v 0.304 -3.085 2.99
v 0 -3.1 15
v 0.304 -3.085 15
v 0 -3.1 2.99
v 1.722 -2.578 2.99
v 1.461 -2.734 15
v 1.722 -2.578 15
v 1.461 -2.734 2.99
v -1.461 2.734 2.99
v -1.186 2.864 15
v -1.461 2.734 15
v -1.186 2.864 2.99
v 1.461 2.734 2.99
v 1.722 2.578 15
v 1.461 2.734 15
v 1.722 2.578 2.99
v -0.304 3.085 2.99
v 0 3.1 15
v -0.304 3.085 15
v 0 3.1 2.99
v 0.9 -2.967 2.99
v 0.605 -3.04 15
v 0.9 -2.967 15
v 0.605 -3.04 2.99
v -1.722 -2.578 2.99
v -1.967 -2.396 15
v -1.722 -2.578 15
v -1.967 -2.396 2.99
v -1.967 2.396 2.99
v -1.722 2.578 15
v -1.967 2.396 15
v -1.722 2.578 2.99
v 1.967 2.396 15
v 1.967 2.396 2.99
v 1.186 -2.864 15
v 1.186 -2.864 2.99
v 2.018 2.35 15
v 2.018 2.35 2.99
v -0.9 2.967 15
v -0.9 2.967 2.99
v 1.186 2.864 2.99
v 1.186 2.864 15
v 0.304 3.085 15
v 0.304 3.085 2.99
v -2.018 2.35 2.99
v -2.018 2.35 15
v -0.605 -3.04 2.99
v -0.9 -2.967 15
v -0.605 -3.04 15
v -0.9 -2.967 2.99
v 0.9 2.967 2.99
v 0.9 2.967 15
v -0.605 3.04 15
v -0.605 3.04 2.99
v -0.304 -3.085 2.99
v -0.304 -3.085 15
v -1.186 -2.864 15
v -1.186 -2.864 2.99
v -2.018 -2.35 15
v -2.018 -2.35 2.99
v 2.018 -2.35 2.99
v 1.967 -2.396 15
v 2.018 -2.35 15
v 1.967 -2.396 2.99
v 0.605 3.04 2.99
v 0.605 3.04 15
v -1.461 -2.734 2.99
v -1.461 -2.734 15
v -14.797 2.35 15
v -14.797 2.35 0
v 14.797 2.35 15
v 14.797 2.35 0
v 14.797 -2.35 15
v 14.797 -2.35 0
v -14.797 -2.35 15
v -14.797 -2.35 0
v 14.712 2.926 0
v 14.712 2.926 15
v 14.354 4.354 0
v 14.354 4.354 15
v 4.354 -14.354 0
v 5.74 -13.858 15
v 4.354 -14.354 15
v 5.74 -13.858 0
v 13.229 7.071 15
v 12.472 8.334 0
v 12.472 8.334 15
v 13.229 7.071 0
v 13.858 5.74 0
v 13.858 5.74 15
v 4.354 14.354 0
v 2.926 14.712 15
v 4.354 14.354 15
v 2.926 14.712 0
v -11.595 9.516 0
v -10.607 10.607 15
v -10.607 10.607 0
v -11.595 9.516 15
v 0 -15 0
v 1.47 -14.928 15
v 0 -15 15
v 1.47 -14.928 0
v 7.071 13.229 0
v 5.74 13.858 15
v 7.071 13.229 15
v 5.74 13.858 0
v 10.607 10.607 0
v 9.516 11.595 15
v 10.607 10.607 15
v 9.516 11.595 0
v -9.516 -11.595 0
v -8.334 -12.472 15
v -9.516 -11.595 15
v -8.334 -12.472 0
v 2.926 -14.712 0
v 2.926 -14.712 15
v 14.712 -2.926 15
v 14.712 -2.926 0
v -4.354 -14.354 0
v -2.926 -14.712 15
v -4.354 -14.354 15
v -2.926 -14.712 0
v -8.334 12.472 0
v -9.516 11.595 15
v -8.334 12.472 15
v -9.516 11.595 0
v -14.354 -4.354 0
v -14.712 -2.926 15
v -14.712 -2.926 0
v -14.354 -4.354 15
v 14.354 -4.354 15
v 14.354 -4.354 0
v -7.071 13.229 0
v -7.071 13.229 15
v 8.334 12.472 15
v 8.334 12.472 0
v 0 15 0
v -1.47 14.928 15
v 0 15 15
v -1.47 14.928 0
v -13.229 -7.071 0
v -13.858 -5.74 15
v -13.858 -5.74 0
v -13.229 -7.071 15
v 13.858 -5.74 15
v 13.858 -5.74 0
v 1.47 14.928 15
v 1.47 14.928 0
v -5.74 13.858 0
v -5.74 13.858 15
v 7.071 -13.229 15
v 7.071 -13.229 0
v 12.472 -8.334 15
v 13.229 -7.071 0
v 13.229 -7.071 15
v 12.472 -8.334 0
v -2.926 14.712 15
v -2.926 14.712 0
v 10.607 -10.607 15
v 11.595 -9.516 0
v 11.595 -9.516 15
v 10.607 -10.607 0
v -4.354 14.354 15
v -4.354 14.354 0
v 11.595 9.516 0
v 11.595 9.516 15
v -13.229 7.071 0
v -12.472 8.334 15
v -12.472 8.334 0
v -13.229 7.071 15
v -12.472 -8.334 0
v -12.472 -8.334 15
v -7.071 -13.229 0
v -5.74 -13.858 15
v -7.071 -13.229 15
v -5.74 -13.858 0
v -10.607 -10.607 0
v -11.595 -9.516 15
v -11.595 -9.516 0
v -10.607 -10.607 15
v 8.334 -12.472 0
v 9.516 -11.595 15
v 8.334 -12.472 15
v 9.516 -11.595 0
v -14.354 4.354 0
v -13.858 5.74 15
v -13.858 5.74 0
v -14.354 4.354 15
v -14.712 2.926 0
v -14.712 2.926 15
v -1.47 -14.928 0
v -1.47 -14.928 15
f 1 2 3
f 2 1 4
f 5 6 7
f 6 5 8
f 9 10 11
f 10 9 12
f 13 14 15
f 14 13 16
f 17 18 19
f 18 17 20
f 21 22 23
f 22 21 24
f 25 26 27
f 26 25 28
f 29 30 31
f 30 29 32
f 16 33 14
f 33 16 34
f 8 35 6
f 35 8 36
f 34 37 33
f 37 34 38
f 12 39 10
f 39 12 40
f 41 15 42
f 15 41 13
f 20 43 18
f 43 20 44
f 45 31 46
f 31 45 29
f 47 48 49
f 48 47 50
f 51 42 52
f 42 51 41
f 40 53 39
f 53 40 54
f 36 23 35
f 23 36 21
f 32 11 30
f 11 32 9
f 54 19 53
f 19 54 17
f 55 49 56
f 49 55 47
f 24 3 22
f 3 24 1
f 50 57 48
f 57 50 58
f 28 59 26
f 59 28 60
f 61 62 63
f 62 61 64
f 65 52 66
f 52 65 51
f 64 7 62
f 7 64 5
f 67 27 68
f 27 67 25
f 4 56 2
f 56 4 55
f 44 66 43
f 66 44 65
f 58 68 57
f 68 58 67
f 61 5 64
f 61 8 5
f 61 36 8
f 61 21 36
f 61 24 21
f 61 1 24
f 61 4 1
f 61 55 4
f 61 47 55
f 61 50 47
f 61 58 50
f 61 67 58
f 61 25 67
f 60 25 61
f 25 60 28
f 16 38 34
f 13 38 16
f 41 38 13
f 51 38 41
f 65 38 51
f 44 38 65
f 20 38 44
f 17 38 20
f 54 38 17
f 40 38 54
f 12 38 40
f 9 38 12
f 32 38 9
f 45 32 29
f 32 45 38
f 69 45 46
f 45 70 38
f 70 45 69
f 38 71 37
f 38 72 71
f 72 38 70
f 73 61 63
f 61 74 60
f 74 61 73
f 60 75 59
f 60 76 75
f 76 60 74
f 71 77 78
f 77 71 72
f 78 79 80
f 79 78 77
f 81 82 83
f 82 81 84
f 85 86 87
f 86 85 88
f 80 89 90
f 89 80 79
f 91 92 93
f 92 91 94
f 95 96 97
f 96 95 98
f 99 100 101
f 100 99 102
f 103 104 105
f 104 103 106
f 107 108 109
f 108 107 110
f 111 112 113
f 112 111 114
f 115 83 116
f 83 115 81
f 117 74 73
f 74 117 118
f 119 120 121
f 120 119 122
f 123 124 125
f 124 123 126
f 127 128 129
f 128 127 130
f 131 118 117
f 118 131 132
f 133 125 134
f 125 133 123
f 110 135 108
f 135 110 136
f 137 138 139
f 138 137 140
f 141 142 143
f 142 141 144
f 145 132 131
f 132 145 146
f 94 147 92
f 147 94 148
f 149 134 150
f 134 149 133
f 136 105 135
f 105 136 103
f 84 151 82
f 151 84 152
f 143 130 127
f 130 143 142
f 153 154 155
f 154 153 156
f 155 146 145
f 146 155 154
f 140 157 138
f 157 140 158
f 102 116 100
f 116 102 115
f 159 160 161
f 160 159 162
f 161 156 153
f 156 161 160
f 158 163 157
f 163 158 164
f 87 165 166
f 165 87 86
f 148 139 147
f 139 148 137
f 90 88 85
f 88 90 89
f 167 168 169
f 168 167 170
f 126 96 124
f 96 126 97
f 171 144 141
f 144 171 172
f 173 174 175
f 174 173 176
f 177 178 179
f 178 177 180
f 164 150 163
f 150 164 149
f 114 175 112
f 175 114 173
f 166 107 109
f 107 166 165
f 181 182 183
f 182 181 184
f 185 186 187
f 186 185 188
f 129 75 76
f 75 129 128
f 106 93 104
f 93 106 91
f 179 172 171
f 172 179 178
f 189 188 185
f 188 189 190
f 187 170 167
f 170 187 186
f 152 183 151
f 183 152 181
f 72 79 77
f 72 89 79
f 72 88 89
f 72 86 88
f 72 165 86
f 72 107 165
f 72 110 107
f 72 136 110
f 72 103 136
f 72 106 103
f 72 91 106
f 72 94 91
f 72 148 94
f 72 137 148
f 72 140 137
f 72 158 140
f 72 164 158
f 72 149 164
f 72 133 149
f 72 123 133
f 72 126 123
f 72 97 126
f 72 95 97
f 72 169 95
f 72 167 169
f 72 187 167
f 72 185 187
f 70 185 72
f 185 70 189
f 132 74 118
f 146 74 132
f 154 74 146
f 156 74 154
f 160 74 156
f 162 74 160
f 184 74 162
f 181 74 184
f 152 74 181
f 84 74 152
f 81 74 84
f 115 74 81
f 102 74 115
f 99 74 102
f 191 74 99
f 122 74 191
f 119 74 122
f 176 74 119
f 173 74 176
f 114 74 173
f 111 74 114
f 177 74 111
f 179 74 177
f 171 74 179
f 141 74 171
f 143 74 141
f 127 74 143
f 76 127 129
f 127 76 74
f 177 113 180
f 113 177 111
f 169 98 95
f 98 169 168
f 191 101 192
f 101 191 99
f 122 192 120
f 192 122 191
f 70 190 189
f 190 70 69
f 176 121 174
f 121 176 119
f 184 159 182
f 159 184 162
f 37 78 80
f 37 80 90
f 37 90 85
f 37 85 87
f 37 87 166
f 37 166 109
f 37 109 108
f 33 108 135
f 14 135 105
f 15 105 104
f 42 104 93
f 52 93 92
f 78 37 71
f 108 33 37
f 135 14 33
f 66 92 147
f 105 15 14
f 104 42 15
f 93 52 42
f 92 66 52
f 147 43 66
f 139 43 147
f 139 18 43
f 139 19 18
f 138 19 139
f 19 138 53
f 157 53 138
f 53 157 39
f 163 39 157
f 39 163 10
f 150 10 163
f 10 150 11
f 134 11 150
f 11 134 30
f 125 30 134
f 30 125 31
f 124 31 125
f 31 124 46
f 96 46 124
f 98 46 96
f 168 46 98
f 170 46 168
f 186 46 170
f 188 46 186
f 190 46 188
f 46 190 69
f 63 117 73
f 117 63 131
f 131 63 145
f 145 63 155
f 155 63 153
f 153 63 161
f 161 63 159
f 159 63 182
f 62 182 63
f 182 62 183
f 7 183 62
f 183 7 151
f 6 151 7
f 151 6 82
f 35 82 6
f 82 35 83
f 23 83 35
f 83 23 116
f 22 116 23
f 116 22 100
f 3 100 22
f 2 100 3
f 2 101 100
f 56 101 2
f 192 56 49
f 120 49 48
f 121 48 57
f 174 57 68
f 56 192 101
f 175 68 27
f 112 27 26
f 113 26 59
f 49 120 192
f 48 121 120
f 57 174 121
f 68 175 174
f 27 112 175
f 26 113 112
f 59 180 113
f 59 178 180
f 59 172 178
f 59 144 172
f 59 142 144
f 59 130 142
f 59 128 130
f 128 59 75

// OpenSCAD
// Built by bench/smallmodels/features/compiler.py from a list of features.
$fn = 64;
difference() {
  union() {
    translate([0, 0, 0]) cylinder(d = 30, h = 15);
  }
  union() {
    translate([0, 0, 2.99]) rotate([0, 0, 0]) cylinder(d = 6.2, h = 12.02);
    translate([0, 0, -0.01]) rotate([0, 0, 0]) translate([-15, -2.35, 0]) cube([30, 4.7, 15.02]);
  }
}
